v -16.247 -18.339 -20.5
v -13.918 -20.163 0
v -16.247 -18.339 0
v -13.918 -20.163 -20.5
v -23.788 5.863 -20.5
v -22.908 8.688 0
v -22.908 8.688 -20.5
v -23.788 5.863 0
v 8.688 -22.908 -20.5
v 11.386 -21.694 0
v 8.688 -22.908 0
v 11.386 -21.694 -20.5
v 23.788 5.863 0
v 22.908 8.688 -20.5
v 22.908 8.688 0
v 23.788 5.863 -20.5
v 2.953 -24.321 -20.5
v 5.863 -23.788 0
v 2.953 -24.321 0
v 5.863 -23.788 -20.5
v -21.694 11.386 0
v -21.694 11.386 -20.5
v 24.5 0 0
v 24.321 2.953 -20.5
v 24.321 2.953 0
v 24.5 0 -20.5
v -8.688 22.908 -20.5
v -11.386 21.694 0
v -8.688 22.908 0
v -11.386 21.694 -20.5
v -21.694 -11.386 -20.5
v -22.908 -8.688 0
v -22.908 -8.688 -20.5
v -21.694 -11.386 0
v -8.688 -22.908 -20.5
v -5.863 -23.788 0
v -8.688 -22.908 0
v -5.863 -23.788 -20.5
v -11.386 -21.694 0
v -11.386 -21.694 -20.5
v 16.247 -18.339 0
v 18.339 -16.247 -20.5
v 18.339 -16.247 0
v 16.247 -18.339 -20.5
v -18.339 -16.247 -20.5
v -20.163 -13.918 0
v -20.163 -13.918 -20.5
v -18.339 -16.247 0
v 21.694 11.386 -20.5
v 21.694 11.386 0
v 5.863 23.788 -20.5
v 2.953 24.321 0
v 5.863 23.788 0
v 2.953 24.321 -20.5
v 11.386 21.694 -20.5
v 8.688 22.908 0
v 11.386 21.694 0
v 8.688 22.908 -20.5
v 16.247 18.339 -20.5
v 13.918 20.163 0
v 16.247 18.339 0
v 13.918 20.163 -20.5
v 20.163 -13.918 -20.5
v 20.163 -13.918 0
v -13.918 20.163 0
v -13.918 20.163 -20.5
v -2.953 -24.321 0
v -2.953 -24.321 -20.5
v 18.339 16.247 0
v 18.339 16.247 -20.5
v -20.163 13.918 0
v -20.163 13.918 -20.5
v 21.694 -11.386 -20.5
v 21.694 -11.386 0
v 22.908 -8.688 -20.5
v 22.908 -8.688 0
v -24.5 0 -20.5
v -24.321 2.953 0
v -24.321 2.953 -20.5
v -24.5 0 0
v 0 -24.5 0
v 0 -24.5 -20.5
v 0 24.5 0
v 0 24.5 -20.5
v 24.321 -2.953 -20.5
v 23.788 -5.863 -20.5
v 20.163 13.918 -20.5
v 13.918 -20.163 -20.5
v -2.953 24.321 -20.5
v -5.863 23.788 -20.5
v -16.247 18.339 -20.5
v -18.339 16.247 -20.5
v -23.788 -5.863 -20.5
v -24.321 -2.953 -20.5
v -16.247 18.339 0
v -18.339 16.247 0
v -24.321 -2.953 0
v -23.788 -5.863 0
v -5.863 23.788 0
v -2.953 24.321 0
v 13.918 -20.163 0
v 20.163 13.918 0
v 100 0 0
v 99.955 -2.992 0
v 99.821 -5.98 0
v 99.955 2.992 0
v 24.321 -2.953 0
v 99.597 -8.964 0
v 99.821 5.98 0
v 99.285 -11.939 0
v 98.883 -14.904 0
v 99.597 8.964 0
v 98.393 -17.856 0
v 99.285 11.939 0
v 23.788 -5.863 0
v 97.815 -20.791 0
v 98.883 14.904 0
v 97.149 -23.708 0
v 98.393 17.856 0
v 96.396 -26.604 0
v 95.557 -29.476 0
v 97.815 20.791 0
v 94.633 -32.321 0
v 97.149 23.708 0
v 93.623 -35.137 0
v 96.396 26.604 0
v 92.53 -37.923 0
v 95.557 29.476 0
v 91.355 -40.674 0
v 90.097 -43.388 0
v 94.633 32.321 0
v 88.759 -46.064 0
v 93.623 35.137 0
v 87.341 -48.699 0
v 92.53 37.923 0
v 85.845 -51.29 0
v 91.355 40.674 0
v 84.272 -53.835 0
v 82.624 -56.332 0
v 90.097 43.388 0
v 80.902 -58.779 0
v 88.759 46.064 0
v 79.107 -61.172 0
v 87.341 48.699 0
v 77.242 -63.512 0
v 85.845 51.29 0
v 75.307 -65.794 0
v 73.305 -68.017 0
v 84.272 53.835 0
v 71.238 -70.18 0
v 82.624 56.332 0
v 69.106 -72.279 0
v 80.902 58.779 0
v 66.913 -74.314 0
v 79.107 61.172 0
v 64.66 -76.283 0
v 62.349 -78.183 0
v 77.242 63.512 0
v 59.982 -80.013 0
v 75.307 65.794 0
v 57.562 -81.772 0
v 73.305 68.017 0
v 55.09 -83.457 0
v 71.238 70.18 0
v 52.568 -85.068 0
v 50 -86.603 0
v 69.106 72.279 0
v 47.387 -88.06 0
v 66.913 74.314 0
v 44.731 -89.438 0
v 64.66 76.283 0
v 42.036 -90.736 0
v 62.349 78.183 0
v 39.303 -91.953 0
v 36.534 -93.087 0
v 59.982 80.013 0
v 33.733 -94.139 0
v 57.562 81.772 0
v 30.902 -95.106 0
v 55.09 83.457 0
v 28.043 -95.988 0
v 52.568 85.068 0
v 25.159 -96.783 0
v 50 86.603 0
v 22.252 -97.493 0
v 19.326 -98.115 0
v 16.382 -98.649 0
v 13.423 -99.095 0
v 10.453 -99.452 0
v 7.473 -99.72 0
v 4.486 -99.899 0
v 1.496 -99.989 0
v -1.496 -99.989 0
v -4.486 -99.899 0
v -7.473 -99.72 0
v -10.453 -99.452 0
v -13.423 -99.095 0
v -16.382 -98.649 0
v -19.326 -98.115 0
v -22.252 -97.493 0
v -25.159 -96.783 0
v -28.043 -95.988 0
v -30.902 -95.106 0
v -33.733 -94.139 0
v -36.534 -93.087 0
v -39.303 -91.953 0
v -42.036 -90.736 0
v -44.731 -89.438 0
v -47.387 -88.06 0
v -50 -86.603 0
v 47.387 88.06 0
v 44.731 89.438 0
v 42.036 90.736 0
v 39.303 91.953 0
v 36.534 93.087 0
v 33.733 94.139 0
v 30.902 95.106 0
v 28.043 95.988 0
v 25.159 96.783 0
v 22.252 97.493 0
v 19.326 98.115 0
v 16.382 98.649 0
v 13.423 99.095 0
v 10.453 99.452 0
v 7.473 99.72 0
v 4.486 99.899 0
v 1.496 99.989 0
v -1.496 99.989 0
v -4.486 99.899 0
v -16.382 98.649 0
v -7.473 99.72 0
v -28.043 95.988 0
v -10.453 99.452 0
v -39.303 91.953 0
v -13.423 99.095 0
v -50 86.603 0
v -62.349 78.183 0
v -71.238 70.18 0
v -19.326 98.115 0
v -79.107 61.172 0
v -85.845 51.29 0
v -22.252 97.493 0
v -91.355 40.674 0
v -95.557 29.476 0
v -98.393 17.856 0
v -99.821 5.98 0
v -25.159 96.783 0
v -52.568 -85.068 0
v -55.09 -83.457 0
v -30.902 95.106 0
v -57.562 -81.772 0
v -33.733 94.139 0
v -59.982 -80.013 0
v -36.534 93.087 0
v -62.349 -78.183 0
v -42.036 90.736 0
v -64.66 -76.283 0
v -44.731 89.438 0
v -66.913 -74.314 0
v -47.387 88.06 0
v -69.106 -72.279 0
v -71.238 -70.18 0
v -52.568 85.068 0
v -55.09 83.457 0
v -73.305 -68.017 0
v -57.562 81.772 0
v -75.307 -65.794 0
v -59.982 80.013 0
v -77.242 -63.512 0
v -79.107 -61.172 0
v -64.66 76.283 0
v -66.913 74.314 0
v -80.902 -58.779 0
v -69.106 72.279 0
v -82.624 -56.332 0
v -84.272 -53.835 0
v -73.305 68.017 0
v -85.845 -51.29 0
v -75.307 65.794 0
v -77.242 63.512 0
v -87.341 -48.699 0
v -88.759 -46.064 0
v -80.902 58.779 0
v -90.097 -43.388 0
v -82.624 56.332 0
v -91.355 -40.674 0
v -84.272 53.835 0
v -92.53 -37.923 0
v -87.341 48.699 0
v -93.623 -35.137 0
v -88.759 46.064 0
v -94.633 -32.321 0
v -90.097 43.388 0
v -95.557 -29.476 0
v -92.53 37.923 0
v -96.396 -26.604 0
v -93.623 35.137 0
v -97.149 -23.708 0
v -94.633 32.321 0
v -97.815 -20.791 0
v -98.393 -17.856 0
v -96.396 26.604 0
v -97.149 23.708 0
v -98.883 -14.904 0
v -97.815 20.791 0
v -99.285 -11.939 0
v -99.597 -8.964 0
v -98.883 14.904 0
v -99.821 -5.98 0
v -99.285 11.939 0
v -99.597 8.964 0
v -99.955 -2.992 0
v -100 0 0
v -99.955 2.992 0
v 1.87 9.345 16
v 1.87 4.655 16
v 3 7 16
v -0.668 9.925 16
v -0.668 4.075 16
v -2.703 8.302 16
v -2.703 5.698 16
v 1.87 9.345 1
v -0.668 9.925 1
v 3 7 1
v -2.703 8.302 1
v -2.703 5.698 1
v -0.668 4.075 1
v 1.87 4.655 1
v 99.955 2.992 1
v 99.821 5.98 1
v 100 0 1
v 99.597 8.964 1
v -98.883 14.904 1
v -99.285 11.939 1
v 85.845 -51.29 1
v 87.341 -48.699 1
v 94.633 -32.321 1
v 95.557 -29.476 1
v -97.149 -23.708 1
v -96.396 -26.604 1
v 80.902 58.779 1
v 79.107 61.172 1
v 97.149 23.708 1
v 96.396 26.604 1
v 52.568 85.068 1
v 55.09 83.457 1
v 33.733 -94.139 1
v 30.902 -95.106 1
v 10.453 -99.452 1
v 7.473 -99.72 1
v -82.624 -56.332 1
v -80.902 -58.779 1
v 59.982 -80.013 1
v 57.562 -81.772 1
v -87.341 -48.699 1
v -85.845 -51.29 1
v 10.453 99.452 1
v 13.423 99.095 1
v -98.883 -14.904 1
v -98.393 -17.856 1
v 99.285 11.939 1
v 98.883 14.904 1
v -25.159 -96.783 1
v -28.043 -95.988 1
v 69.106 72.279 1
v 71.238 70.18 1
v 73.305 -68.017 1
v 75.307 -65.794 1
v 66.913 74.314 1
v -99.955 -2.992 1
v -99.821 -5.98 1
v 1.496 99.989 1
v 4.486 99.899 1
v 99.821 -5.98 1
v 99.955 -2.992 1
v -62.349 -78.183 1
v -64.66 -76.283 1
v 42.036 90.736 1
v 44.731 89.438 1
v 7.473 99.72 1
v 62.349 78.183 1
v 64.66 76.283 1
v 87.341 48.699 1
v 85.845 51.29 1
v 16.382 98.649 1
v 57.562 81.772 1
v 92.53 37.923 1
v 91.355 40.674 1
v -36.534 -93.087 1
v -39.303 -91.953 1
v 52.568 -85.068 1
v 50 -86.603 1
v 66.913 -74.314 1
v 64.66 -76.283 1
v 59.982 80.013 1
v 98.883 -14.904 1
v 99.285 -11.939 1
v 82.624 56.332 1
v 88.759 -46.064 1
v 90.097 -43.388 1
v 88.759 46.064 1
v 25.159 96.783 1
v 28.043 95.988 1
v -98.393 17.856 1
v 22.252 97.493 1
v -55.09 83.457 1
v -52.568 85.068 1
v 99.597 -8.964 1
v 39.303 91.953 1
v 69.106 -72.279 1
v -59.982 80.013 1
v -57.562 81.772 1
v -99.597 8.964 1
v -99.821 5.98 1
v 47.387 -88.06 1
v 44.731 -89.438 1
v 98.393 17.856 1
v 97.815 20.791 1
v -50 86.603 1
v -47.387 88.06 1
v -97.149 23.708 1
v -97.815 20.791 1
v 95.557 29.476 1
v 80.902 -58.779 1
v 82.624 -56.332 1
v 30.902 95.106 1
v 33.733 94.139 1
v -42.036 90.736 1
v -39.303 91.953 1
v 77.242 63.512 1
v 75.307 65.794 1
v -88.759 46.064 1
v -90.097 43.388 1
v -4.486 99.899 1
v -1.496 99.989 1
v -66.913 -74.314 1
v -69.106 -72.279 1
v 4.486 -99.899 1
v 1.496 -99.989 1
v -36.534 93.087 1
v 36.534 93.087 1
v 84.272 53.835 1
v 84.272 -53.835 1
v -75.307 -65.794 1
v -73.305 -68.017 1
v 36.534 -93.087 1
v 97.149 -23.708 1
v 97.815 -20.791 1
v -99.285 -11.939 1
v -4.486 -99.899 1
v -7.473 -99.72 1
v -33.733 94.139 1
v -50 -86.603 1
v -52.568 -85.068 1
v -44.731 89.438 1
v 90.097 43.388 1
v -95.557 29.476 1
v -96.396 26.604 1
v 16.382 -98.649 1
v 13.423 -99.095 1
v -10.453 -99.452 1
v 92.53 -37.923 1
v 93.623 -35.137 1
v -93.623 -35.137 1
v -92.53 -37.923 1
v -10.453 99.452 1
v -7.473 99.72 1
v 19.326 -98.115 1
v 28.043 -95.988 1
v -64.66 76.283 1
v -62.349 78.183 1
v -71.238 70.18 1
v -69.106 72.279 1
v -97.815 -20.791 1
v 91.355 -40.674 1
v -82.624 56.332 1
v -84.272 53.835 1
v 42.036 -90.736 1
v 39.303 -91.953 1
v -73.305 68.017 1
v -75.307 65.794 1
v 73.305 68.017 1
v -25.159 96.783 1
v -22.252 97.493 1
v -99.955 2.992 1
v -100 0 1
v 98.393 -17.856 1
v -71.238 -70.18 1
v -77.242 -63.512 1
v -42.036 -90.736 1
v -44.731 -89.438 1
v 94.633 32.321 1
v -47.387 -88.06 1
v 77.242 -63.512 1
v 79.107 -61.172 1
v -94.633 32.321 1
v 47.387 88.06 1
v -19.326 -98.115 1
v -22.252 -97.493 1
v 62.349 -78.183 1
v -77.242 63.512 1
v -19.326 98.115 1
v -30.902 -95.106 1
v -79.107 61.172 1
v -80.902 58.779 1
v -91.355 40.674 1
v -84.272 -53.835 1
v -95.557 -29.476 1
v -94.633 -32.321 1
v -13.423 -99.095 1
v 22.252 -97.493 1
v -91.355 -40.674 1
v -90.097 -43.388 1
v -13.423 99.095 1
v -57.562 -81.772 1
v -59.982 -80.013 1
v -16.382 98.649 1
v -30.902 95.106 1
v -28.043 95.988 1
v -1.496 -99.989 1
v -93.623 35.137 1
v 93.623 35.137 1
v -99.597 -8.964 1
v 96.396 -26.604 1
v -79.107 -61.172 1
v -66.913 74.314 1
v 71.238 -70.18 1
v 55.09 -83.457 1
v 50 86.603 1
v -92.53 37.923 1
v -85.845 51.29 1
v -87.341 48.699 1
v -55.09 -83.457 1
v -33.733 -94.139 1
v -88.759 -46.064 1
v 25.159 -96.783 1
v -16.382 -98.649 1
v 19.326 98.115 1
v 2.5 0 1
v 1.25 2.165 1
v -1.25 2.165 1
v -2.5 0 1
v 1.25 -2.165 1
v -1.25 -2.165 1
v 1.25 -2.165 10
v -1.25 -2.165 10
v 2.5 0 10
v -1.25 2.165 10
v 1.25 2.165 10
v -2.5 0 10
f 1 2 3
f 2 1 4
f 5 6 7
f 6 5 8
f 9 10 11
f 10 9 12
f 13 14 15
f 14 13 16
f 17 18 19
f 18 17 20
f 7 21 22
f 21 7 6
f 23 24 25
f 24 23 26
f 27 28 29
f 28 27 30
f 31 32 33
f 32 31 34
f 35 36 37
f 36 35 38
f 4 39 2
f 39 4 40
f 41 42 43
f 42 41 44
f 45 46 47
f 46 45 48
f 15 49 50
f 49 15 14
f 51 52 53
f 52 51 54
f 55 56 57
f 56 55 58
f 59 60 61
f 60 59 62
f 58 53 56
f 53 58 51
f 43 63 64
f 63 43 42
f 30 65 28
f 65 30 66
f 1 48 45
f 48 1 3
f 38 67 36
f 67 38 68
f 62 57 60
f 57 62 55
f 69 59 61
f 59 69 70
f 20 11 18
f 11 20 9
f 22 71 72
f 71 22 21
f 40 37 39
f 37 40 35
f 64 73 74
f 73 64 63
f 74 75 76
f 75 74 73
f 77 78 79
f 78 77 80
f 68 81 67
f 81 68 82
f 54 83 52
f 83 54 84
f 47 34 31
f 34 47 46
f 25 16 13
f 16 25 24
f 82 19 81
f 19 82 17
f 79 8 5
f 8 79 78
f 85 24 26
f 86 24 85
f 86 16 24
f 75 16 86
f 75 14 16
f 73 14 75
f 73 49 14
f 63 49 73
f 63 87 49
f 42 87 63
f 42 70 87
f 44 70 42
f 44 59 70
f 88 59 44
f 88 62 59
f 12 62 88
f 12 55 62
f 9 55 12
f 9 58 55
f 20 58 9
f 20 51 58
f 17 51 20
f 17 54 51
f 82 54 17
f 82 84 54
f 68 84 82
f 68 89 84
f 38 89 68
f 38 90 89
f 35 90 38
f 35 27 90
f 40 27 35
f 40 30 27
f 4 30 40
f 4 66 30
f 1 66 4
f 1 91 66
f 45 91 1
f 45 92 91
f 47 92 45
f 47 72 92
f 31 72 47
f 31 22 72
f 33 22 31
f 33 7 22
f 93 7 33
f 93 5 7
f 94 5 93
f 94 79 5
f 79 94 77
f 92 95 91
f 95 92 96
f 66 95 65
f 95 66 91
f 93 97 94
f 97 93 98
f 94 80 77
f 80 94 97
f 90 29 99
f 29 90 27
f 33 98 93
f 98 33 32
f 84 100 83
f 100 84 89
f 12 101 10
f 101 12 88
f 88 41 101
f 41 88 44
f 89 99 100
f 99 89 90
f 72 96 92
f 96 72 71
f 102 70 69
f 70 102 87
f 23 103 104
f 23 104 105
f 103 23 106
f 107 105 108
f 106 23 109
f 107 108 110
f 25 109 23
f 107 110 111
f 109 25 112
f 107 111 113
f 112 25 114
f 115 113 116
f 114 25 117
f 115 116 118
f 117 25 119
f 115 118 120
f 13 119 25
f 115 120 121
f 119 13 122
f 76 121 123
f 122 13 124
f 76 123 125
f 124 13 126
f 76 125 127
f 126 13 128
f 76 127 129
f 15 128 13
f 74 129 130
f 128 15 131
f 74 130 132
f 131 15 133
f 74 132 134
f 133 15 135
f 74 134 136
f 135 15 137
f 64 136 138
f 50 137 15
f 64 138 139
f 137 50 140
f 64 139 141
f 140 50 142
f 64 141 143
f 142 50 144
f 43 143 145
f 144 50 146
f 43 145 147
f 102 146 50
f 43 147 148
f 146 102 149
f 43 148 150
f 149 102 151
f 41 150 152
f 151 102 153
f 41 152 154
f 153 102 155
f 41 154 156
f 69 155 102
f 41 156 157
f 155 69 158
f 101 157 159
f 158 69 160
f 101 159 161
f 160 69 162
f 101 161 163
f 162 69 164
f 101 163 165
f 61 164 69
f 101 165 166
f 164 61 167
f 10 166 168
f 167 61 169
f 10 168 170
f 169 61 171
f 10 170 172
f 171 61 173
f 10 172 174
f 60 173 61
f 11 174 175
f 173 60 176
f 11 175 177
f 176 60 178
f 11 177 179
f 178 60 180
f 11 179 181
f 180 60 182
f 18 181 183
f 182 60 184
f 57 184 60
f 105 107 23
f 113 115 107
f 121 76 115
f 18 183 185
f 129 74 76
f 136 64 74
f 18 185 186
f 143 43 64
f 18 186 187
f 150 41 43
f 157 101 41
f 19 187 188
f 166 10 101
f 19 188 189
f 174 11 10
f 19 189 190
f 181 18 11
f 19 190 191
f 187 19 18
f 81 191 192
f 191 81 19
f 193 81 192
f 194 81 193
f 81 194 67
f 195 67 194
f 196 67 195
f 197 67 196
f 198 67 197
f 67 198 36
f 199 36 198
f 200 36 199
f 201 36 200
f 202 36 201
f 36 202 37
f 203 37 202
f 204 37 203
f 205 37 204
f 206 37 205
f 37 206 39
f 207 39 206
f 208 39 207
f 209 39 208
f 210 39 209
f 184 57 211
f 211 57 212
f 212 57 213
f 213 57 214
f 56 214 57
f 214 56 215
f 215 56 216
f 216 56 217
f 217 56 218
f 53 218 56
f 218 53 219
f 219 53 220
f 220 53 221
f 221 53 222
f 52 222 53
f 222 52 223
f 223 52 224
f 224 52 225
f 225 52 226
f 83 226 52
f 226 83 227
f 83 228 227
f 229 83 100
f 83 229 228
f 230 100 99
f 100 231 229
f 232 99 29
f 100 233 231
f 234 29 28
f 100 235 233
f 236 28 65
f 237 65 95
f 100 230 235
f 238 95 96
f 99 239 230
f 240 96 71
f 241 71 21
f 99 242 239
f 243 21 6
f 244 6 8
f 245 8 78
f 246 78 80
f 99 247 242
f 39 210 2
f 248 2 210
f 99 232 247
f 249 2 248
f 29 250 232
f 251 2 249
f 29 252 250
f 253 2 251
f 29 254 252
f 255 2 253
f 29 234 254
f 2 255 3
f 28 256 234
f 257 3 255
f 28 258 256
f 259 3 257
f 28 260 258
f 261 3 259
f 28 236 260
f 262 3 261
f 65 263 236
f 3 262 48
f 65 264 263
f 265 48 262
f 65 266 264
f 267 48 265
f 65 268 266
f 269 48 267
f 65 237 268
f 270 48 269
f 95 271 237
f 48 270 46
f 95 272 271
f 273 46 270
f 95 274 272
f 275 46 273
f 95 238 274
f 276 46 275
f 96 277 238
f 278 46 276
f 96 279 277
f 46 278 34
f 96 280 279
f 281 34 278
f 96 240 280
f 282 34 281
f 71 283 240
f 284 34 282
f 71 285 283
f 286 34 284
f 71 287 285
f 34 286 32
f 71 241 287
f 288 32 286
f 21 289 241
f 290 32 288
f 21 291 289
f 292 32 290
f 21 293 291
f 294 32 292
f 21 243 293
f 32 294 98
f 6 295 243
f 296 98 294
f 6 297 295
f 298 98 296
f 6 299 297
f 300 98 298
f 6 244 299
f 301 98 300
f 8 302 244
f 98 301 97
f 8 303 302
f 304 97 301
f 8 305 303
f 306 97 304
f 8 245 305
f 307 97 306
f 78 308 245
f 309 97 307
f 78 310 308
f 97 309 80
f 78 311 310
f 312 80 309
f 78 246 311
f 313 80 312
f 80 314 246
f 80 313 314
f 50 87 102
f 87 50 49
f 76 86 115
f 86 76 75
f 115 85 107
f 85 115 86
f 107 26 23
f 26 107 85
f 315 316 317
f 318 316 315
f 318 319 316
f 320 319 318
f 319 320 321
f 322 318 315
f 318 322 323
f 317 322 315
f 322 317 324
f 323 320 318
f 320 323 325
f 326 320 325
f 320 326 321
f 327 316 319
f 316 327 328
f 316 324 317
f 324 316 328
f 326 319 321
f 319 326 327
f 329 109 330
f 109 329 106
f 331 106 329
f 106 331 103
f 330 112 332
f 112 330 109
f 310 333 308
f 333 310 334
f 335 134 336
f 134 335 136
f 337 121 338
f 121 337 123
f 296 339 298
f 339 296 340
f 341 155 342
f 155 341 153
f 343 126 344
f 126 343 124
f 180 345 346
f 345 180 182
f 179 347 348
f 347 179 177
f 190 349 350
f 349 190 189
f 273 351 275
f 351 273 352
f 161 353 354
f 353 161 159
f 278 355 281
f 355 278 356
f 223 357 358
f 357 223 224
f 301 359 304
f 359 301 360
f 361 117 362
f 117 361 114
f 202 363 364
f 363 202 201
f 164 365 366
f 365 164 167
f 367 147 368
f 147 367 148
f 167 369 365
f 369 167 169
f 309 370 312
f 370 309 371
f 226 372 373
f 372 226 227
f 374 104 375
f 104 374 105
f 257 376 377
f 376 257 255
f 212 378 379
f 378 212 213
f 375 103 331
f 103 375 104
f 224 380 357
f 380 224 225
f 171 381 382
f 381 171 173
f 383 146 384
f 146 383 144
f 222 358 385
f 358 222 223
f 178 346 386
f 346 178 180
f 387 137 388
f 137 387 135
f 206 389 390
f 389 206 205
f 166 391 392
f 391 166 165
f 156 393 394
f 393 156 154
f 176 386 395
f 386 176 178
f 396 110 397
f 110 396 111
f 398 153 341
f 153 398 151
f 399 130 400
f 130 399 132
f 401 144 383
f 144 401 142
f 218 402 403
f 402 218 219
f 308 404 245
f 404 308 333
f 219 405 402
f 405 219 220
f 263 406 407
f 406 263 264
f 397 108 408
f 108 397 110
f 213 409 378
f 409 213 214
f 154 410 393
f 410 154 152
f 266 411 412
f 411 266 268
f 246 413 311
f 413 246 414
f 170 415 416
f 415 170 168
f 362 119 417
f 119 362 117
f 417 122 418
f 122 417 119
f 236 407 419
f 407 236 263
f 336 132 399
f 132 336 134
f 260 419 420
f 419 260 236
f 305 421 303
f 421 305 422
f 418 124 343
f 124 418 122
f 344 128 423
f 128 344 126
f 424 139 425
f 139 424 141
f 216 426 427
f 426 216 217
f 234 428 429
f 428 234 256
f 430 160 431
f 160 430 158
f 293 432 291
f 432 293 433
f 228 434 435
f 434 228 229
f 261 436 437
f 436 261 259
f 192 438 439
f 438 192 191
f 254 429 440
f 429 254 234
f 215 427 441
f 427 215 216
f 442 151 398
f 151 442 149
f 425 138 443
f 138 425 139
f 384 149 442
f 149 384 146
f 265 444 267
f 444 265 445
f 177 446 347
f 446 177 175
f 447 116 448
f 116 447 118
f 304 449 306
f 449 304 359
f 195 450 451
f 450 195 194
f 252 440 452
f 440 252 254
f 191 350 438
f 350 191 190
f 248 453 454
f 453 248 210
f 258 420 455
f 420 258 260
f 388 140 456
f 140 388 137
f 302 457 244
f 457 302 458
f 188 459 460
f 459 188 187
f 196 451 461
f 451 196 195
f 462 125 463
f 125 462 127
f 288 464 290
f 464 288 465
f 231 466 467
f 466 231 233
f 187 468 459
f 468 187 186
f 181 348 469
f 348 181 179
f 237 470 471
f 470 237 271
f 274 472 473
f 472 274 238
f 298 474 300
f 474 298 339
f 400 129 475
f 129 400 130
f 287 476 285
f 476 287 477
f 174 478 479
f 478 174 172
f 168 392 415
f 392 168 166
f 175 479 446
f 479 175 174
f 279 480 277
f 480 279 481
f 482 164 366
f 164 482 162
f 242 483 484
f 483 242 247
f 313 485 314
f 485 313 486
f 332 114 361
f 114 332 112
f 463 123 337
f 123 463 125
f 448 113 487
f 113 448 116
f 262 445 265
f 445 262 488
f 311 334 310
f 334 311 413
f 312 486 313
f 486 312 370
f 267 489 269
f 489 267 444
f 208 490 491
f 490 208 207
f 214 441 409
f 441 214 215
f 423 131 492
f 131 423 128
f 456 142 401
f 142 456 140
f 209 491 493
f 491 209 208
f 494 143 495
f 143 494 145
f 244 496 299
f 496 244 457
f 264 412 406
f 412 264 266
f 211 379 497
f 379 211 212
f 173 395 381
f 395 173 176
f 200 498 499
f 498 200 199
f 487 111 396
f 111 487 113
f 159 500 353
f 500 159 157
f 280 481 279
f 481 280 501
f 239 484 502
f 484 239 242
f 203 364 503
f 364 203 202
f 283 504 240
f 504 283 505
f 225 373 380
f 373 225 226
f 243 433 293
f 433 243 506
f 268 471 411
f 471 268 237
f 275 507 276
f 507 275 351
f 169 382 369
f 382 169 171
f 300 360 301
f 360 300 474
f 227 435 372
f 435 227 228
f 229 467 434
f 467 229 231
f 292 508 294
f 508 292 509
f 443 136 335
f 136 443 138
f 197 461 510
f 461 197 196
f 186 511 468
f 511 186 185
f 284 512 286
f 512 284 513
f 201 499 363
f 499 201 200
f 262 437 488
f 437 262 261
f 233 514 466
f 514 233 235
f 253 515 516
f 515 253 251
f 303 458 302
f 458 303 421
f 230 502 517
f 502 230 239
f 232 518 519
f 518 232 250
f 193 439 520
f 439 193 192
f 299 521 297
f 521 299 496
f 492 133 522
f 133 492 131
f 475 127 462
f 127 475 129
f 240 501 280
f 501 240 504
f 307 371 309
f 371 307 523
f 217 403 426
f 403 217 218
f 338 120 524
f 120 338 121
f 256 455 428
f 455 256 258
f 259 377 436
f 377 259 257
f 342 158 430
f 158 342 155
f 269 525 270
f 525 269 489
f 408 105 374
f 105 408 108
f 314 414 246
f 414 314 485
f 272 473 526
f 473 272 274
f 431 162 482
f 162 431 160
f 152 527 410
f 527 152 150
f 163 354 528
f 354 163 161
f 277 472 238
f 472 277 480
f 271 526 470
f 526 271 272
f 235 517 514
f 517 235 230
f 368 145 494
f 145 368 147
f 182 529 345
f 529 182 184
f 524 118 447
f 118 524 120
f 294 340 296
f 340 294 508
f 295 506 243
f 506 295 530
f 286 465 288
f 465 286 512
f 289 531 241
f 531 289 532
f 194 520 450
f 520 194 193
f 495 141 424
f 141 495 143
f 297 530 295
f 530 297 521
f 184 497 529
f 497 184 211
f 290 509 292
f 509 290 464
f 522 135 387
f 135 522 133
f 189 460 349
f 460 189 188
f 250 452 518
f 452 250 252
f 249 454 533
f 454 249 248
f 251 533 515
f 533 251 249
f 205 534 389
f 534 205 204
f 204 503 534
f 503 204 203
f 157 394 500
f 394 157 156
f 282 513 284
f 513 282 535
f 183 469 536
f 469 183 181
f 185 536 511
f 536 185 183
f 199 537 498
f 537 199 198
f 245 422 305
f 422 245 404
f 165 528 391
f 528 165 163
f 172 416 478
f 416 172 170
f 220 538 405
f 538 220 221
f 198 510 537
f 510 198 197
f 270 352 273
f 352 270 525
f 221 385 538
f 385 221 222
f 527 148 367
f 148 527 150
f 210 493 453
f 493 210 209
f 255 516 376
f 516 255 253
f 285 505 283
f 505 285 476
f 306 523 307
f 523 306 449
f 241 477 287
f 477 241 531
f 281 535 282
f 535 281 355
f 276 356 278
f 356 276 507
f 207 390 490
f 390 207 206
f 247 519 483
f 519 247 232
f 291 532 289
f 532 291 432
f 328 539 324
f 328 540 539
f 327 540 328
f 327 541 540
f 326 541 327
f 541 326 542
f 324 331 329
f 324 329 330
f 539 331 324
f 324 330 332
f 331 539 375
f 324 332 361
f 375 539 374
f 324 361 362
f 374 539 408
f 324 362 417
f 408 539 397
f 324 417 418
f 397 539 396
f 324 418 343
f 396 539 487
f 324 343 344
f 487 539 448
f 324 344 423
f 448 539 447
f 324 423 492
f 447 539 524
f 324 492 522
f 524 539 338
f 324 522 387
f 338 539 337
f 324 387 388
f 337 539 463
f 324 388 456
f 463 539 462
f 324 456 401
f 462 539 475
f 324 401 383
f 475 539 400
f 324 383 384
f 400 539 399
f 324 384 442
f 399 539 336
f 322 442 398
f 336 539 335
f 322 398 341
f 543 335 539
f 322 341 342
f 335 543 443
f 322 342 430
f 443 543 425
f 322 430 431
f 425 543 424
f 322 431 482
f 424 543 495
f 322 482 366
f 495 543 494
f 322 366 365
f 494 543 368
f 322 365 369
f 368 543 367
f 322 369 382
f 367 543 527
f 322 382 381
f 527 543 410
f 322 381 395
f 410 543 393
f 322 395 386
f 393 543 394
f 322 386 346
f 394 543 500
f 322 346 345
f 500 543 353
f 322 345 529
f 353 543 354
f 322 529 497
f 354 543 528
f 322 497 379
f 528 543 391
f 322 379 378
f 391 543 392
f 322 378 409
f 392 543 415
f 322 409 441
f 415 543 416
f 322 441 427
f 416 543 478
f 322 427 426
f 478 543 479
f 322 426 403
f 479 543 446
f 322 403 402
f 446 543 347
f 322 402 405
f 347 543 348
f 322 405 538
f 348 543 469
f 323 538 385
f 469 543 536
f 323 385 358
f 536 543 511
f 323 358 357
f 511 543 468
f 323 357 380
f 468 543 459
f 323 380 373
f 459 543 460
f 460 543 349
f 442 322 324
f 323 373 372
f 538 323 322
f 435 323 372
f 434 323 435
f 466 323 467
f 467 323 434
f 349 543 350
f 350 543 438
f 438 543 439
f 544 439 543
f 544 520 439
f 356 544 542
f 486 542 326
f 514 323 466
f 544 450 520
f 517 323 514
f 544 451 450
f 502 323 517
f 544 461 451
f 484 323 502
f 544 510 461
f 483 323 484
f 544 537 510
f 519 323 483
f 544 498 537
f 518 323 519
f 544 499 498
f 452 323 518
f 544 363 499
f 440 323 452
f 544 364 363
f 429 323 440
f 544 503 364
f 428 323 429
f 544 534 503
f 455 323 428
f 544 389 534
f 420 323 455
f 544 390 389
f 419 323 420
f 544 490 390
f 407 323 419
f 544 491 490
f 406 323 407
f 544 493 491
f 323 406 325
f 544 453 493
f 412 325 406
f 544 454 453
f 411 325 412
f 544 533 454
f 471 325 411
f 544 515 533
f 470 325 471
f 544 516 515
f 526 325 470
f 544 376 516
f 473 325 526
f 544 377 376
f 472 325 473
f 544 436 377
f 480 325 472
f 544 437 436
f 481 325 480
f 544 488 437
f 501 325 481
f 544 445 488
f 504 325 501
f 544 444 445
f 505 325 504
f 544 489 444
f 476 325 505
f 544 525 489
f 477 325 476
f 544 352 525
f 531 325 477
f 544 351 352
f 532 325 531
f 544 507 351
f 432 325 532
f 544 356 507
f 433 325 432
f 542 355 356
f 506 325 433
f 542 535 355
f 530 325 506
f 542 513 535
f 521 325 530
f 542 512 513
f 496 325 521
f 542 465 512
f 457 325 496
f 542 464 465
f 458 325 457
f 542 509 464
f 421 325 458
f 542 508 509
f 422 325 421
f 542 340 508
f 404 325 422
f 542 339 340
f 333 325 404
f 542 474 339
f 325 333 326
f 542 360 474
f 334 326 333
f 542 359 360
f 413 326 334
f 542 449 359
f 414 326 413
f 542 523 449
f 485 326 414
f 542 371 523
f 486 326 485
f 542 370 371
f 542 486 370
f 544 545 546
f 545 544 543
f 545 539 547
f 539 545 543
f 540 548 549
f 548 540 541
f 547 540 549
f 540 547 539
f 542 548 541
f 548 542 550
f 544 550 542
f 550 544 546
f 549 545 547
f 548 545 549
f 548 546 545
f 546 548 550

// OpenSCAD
$fa=.01;
$fs=3;

motor_rpm = 3;
max_print_area = 200;


module motor(){
  mirror([0,0,1]) cylinder(d=49, h=20.5);
  translate([0,7,0]) cylinder(h=16,d=6);
}

#motor();

cylinder(d=max_print_area);
color("red") cylinder(d=5,h=10);
